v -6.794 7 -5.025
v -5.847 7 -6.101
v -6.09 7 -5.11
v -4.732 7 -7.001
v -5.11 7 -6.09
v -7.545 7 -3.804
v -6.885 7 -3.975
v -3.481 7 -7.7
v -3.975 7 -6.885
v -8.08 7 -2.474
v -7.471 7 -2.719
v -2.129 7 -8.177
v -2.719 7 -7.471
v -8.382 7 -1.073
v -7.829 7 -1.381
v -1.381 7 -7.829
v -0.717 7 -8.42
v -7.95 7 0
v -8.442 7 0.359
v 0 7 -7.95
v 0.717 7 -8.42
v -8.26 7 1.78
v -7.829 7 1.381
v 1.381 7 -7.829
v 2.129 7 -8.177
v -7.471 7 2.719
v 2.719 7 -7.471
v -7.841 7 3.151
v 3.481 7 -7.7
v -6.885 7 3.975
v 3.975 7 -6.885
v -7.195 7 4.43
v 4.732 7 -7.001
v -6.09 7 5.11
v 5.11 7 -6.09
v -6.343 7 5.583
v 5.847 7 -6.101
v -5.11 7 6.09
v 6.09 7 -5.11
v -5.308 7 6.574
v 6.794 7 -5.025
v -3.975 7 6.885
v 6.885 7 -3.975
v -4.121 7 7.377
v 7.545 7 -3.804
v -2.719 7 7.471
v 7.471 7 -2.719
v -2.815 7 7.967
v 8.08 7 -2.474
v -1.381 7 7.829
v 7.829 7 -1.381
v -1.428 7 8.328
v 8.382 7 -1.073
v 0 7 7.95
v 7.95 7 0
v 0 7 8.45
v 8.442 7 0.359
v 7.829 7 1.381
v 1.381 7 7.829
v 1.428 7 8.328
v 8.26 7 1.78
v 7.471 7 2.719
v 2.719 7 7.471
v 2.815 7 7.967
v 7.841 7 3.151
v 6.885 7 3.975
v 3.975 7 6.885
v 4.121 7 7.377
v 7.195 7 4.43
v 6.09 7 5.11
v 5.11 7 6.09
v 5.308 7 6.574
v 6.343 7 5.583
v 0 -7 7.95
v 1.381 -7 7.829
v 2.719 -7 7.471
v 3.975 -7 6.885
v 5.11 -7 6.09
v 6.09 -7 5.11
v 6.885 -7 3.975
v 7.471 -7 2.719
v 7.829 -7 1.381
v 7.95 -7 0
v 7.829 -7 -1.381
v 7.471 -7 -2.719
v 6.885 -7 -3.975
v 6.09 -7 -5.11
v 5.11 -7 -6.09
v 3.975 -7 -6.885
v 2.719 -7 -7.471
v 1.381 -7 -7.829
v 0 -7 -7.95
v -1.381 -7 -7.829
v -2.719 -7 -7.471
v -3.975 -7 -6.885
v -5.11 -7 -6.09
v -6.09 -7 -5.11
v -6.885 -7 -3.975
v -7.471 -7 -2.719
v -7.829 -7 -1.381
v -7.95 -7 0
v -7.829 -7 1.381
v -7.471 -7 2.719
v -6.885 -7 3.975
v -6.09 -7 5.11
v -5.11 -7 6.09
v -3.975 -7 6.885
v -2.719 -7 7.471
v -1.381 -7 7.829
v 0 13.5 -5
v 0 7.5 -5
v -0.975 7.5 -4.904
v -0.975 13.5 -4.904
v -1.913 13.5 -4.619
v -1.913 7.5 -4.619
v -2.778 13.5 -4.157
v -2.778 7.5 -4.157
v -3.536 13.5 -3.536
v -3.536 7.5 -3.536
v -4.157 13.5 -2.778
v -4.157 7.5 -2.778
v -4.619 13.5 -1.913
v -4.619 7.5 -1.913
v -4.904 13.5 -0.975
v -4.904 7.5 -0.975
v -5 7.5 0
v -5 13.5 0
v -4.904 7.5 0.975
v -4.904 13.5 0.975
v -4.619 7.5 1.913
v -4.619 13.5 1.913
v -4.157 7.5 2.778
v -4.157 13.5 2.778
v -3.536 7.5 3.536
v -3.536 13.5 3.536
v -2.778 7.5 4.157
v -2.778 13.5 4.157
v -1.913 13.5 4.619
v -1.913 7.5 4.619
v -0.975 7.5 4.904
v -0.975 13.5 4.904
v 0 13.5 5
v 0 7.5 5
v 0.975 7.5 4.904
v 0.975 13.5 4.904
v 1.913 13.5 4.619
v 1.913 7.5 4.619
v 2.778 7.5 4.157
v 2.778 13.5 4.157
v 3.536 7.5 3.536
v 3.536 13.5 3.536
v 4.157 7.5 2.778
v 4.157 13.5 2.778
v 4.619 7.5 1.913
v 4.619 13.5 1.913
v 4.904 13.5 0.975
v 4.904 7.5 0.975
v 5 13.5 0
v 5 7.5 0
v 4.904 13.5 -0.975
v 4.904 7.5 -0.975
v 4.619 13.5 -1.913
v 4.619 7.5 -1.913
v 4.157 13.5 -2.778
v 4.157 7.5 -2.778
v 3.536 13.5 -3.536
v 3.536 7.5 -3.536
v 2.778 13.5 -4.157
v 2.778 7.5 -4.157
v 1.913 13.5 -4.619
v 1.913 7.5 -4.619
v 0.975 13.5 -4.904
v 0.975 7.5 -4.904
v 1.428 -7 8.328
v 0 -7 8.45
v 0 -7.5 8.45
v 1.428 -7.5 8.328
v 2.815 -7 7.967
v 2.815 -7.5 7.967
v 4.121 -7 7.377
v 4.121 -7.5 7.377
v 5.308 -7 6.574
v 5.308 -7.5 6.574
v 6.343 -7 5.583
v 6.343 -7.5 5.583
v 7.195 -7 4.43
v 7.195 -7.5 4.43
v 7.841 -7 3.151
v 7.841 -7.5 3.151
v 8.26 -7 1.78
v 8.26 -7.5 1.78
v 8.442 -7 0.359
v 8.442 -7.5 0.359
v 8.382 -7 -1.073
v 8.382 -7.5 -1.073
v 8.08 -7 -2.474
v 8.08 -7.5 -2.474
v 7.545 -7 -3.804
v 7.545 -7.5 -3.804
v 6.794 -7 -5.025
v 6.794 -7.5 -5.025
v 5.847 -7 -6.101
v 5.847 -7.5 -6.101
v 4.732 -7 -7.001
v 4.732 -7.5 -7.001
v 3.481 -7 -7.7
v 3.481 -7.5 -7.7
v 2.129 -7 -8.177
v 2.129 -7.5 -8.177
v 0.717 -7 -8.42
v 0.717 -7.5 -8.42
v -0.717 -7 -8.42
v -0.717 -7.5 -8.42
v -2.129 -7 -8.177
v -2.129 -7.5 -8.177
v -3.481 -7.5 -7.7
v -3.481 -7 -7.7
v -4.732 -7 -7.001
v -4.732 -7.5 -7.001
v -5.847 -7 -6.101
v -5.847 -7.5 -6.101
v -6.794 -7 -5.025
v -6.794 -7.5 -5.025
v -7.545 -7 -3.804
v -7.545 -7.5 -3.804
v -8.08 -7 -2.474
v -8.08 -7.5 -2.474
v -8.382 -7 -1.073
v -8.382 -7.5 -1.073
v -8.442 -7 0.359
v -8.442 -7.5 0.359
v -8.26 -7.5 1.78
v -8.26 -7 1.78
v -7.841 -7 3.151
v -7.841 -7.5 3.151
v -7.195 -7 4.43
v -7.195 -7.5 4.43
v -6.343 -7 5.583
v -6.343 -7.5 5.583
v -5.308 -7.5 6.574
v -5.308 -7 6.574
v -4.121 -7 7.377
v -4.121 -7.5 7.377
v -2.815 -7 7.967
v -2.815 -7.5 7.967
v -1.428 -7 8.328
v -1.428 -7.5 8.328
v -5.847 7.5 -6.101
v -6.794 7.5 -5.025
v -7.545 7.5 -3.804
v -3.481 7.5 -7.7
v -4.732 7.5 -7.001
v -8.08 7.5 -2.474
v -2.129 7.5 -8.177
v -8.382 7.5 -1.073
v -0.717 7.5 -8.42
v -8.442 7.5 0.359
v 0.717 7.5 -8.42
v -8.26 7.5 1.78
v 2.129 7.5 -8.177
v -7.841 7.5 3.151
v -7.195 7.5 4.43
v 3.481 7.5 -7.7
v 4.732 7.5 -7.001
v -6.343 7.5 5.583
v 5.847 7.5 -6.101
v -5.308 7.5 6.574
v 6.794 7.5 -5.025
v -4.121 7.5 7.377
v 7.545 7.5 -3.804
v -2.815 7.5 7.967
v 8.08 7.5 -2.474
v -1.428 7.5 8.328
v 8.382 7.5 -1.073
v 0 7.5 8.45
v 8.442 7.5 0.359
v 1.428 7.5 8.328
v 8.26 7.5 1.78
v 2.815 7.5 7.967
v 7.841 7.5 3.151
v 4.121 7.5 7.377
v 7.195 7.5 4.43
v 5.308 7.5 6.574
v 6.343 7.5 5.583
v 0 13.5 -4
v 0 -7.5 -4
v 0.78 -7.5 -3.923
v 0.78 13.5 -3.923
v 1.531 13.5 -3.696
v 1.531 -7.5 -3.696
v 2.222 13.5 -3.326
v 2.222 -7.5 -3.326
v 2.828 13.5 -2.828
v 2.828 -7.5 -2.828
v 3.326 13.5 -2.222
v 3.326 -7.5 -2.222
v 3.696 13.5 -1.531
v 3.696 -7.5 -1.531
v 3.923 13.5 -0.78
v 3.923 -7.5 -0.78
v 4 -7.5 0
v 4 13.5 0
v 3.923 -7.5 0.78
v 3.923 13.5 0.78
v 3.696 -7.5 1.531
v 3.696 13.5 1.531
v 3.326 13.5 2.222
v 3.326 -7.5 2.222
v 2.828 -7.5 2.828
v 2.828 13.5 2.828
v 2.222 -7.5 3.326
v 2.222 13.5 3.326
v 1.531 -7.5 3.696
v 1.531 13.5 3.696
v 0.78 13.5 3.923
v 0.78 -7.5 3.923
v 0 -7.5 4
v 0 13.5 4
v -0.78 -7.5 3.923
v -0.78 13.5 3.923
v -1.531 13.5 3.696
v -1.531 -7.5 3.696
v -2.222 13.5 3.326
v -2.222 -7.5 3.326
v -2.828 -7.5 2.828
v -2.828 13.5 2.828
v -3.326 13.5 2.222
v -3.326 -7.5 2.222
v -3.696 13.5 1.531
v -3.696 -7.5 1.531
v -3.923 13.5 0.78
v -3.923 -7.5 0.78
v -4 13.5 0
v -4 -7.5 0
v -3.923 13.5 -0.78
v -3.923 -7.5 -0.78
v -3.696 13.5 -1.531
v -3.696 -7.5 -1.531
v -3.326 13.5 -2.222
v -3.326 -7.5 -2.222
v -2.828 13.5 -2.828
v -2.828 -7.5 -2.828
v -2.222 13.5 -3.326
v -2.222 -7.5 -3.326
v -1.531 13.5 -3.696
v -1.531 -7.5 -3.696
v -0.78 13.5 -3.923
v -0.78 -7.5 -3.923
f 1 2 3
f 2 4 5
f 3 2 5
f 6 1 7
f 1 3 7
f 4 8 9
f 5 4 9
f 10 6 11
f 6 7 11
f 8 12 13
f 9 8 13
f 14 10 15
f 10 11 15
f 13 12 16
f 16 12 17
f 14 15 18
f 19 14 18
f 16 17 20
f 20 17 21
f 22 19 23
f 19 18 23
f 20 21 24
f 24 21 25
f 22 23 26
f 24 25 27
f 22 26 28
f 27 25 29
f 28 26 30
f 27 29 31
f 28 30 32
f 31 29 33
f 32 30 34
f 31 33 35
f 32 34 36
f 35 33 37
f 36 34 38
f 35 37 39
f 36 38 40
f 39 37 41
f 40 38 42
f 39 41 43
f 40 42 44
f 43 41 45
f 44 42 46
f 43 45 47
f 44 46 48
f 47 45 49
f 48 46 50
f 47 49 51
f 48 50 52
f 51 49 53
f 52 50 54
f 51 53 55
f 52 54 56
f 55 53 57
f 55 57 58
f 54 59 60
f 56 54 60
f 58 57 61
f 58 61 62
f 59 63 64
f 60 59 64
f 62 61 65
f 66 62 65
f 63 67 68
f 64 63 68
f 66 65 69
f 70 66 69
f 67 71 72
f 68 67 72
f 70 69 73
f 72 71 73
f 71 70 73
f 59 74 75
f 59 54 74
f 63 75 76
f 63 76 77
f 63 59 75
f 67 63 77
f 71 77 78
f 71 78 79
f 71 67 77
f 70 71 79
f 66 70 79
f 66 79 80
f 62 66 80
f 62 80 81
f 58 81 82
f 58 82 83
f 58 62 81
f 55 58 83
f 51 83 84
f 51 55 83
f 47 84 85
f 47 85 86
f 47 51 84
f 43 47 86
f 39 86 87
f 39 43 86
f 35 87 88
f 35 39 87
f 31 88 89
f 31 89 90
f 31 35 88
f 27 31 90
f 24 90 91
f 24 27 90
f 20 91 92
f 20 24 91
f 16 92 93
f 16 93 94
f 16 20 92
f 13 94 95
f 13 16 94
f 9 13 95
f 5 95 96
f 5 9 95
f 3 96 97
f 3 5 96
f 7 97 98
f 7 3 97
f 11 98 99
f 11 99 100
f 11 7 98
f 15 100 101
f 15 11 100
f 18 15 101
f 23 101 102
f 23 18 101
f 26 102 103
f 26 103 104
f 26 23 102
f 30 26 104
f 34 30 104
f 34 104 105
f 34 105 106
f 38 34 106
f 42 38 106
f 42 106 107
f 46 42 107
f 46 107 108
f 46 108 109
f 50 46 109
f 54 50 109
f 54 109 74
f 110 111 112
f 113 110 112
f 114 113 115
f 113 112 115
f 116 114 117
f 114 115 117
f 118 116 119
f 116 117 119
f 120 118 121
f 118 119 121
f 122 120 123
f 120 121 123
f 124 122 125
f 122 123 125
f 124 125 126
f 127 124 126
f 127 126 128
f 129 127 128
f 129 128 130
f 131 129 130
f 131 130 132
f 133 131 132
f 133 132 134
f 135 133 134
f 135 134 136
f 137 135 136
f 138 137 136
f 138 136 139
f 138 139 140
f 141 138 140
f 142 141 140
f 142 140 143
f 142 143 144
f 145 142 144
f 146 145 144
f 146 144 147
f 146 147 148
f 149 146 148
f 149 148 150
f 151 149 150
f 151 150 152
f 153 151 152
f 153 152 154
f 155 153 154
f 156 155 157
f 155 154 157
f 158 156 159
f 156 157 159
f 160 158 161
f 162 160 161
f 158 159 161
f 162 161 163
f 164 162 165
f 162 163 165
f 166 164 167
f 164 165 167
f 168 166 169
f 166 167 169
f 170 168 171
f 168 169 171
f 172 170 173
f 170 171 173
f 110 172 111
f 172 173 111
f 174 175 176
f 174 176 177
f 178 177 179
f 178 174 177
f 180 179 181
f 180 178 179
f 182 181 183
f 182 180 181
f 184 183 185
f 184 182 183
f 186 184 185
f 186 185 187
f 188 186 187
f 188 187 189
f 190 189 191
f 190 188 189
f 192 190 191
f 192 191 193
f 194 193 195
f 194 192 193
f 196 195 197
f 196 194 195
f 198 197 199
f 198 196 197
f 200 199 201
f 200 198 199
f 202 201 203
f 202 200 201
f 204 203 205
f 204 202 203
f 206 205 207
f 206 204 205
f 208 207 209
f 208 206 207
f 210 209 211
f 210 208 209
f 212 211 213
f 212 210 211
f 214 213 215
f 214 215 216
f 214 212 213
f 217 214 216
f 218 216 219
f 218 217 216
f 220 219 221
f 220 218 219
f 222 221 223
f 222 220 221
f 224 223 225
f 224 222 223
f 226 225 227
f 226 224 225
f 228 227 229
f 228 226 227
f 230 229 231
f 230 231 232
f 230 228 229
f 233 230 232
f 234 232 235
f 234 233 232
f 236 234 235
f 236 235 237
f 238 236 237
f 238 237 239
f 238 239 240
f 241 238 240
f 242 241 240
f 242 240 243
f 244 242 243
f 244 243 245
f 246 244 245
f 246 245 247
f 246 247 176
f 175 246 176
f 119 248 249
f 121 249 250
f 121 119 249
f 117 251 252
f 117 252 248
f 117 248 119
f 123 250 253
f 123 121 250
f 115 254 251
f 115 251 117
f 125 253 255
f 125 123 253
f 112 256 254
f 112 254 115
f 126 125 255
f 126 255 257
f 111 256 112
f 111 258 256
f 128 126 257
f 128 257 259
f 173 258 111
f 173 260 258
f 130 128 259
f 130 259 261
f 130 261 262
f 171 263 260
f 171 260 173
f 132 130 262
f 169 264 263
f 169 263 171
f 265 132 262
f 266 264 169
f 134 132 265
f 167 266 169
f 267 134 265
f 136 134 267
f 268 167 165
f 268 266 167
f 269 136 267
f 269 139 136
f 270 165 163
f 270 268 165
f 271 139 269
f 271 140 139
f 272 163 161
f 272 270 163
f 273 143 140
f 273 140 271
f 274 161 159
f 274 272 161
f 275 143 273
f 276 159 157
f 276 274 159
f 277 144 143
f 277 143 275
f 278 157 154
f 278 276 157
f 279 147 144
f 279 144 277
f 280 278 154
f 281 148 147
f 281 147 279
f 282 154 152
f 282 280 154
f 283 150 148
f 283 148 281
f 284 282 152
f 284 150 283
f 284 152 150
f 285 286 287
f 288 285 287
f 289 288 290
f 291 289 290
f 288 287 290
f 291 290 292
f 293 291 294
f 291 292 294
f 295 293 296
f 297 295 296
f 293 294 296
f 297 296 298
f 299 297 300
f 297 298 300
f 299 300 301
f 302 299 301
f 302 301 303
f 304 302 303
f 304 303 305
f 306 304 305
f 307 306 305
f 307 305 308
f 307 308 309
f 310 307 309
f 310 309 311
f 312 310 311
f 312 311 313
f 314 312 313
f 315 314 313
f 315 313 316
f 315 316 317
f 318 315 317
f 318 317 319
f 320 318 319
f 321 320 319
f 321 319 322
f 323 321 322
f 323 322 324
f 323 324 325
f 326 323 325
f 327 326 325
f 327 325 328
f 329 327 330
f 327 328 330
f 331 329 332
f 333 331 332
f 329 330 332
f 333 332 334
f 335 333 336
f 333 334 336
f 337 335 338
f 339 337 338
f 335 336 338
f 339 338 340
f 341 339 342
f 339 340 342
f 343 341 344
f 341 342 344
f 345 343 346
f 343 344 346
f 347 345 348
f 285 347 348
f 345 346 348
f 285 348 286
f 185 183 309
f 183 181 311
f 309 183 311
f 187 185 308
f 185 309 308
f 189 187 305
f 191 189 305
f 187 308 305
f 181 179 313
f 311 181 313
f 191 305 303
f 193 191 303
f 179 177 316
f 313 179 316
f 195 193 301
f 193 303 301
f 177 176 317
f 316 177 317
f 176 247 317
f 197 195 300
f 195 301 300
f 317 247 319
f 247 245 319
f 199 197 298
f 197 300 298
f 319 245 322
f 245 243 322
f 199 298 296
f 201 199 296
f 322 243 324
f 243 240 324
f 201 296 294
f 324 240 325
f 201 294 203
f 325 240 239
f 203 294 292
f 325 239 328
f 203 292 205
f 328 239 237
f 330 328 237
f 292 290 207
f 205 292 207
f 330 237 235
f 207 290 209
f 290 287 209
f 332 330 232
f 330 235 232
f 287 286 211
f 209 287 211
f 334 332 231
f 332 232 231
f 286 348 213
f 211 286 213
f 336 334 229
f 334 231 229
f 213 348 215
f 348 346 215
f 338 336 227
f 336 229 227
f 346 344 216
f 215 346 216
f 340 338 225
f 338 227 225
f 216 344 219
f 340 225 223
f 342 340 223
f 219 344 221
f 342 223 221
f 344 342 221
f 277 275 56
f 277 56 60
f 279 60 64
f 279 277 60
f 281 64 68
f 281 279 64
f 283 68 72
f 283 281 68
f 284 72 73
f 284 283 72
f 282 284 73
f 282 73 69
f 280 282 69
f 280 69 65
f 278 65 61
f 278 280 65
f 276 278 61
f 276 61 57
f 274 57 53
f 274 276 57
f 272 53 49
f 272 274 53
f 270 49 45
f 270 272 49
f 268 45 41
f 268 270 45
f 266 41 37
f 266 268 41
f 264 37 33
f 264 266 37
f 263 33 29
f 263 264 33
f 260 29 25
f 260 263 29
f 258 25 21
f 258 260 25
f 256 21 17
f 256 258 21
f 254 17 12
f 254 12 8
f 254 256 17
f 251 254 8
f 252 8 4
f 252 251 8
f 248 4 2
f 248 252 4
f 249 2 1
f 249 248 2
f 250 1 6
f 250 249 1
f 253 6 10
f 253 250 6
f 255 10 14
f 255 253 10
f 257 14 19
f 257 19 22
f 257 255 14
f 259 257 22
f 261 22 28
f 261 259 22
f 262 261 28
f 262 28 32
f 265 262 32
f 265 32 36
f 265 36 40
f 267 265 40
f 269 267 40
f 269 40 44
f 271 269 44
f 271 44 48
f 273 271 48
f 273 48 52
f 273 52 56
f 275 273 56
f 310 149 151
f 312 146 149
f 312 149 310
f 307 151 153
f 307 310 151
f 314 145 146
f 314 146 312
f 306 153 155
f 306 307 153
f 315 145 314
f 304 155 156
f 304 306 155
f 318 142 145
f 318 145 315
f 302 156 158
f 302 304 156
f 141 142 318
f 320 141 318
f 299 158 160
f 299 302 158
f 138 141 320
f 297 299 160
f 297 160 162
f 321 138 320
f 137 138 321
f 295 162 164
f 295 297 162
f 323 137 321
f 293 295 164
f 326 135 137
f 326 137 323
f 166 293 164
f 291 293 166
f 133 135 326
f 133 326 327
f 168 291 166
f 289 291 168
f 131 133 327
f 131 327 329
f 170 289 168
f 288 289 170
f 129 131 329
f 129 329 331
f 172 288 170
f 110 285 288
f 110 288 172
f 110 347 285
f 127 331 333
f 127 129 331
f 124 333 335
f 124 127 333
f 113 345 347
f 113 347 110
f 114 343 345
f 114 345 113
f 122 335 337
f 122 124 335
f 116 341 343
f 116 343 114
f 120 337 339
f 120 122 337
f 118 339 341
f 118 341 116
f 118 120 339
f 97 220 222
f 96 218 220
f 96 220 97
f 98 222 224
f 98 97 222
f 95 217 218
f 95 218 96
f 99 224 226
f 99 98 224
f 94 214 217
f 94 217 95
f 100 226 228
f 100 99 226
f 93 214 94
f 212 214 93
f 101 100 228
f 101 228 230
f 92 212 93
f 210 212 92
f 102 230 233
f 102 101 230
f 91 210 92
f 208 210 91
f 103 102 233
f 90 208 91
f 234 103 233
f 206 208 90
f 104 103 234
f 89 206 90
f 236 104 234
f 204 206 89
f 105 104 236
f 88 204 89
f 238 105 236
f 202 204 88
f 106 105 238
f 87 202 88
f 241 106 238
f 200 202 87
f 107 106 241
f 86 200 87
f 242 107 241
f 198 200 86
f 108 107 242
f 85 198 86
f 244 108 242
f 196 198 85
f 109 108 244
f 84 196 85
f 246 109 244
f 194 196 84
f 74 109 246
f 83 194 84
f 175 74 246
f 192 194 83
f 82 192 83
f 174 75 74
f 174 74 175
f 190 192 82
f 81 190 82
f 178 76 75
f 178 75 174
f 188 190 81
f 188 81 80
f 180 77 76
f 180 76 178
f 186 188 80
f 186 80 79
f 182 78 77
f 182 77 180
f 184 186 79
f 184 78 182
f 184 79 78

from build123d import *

# Parameters (mm, degrees)
CROQUIS1_R                 = 7.95
SALIENTE_EXTRUIR1_DEPTH    = 7.5
CROQUIS2_R                 = 8.45
SALIENTE_EXTRUIR2_DEPTH    = 0.5
SALIENTE_EXTRUIR3_START    = -14.5
CROQUIS2_2_R               = 8.45
SALIENTE_EXTRUIR3_DEPTH    = 0.5
CROQUIS3_R                 = 5
SALIENTE_EXTRUIR4_DEPTH    = 21
CORTAR_EXTRUIR1_DEPTH      = 24.728779994
CORTAR_EXTRUIR1_DEPTH_BACK = 24.728779994
CROQUIS4_R                 = 3
CROQUIS10_R                = 4
CORTAR_EXTRUIR2_DEPTH      = 25.162057032


with BuildPart() as part:
    # Croquis1 → Saliente-Extruir1 (new, symmetric)
    with BuildSketch(Plane(origin=(0, 0, 0), x_dir=(-1, 0, 0), z_dir=(0, 1, 0))):
        with Locations(Location((0, 0, 0), (0, 0, 90))):
            Circle(CROQUIS1_R)
    extrude(amount=SALIENTE_EXTRUIR1_DEPTH, both=True)

    # Croquis2 → Saliente-Extruir2 (add)
    with BuildSketch(Plane(origin=(0, 7.5, 0), x_dir=(-1, 0, 0), z_dir=(0, 1, 0))):
        with Locations(Location((0, 0, 0), (0, 0, 90))):
            Circle(CROQUIS2_R)
    extrude(amount=-SALIENTE_EXTRUIR2_DEPTH)

    # Croquis2<2> → Saliente-Extruir3 (add)
    with BuildSketch(Plane(origin=(0, 7.5, 0), x_dir=(-1, 0, 0), z_dir=(0, 1, 0)).offset(SALIENTE_EXTRUIR3_START)):
        with Locations(Location((0, 0, 0), (0, 0, 90))):
            Circle(CROQUIS2_2_R)
    extrude(amount=-SALIENTE_EXTRUIR3_DEPTH)

    # Croquis3 → Saliente-Extruir4 (add)
    with BuildSketch(Plane(origin=(0, -7.5, 0), x_dir=(-1, 0, 0), z_dir=(0, 1, 0))):
        with Locations(Location((0, 0, 0), (0, 0, 270))):
            Circle(CROQUIS3_R)
    extrude(amount=SALIENTE_EXTRUIR4_DEPTH)

    # Croquis4 → Cortar-Extruir1 (cut, two sides: drawn at the far end of the back side and taken through both)
    with BuildSketch(Plane(origin=(0, -7, 0), x_dir=(-1, 0, 0), z_dir=(0, 1, 0)).offset(-CORTAR_EXTRUIR1_DEPTH_BACK)):
        with Locations(Location((0, 0, 0), (0, 0, 90))):
            Circle(CROQUIS4_R)
    extrude(amount=CORTAR_EXTRUIR1_DEPTH + CORTAR_EXTRUIR1_DEPTH_BACK, mode=Mode.SUBTRACT)

    # Croquis10 → Cortar-Extruir2 (cut, through all)
    with BuildSketch(Plane.XZ.offset(7.5)):
        with Locations(Location((0, 0, 0), (0, 0, 270))):
            Circle(CROQUIS10_R)
    extrude(amount=-CORTAR_EXTRUIR2_DEPTH, mode=Mode.SUBTRACT)


solid = part.part
